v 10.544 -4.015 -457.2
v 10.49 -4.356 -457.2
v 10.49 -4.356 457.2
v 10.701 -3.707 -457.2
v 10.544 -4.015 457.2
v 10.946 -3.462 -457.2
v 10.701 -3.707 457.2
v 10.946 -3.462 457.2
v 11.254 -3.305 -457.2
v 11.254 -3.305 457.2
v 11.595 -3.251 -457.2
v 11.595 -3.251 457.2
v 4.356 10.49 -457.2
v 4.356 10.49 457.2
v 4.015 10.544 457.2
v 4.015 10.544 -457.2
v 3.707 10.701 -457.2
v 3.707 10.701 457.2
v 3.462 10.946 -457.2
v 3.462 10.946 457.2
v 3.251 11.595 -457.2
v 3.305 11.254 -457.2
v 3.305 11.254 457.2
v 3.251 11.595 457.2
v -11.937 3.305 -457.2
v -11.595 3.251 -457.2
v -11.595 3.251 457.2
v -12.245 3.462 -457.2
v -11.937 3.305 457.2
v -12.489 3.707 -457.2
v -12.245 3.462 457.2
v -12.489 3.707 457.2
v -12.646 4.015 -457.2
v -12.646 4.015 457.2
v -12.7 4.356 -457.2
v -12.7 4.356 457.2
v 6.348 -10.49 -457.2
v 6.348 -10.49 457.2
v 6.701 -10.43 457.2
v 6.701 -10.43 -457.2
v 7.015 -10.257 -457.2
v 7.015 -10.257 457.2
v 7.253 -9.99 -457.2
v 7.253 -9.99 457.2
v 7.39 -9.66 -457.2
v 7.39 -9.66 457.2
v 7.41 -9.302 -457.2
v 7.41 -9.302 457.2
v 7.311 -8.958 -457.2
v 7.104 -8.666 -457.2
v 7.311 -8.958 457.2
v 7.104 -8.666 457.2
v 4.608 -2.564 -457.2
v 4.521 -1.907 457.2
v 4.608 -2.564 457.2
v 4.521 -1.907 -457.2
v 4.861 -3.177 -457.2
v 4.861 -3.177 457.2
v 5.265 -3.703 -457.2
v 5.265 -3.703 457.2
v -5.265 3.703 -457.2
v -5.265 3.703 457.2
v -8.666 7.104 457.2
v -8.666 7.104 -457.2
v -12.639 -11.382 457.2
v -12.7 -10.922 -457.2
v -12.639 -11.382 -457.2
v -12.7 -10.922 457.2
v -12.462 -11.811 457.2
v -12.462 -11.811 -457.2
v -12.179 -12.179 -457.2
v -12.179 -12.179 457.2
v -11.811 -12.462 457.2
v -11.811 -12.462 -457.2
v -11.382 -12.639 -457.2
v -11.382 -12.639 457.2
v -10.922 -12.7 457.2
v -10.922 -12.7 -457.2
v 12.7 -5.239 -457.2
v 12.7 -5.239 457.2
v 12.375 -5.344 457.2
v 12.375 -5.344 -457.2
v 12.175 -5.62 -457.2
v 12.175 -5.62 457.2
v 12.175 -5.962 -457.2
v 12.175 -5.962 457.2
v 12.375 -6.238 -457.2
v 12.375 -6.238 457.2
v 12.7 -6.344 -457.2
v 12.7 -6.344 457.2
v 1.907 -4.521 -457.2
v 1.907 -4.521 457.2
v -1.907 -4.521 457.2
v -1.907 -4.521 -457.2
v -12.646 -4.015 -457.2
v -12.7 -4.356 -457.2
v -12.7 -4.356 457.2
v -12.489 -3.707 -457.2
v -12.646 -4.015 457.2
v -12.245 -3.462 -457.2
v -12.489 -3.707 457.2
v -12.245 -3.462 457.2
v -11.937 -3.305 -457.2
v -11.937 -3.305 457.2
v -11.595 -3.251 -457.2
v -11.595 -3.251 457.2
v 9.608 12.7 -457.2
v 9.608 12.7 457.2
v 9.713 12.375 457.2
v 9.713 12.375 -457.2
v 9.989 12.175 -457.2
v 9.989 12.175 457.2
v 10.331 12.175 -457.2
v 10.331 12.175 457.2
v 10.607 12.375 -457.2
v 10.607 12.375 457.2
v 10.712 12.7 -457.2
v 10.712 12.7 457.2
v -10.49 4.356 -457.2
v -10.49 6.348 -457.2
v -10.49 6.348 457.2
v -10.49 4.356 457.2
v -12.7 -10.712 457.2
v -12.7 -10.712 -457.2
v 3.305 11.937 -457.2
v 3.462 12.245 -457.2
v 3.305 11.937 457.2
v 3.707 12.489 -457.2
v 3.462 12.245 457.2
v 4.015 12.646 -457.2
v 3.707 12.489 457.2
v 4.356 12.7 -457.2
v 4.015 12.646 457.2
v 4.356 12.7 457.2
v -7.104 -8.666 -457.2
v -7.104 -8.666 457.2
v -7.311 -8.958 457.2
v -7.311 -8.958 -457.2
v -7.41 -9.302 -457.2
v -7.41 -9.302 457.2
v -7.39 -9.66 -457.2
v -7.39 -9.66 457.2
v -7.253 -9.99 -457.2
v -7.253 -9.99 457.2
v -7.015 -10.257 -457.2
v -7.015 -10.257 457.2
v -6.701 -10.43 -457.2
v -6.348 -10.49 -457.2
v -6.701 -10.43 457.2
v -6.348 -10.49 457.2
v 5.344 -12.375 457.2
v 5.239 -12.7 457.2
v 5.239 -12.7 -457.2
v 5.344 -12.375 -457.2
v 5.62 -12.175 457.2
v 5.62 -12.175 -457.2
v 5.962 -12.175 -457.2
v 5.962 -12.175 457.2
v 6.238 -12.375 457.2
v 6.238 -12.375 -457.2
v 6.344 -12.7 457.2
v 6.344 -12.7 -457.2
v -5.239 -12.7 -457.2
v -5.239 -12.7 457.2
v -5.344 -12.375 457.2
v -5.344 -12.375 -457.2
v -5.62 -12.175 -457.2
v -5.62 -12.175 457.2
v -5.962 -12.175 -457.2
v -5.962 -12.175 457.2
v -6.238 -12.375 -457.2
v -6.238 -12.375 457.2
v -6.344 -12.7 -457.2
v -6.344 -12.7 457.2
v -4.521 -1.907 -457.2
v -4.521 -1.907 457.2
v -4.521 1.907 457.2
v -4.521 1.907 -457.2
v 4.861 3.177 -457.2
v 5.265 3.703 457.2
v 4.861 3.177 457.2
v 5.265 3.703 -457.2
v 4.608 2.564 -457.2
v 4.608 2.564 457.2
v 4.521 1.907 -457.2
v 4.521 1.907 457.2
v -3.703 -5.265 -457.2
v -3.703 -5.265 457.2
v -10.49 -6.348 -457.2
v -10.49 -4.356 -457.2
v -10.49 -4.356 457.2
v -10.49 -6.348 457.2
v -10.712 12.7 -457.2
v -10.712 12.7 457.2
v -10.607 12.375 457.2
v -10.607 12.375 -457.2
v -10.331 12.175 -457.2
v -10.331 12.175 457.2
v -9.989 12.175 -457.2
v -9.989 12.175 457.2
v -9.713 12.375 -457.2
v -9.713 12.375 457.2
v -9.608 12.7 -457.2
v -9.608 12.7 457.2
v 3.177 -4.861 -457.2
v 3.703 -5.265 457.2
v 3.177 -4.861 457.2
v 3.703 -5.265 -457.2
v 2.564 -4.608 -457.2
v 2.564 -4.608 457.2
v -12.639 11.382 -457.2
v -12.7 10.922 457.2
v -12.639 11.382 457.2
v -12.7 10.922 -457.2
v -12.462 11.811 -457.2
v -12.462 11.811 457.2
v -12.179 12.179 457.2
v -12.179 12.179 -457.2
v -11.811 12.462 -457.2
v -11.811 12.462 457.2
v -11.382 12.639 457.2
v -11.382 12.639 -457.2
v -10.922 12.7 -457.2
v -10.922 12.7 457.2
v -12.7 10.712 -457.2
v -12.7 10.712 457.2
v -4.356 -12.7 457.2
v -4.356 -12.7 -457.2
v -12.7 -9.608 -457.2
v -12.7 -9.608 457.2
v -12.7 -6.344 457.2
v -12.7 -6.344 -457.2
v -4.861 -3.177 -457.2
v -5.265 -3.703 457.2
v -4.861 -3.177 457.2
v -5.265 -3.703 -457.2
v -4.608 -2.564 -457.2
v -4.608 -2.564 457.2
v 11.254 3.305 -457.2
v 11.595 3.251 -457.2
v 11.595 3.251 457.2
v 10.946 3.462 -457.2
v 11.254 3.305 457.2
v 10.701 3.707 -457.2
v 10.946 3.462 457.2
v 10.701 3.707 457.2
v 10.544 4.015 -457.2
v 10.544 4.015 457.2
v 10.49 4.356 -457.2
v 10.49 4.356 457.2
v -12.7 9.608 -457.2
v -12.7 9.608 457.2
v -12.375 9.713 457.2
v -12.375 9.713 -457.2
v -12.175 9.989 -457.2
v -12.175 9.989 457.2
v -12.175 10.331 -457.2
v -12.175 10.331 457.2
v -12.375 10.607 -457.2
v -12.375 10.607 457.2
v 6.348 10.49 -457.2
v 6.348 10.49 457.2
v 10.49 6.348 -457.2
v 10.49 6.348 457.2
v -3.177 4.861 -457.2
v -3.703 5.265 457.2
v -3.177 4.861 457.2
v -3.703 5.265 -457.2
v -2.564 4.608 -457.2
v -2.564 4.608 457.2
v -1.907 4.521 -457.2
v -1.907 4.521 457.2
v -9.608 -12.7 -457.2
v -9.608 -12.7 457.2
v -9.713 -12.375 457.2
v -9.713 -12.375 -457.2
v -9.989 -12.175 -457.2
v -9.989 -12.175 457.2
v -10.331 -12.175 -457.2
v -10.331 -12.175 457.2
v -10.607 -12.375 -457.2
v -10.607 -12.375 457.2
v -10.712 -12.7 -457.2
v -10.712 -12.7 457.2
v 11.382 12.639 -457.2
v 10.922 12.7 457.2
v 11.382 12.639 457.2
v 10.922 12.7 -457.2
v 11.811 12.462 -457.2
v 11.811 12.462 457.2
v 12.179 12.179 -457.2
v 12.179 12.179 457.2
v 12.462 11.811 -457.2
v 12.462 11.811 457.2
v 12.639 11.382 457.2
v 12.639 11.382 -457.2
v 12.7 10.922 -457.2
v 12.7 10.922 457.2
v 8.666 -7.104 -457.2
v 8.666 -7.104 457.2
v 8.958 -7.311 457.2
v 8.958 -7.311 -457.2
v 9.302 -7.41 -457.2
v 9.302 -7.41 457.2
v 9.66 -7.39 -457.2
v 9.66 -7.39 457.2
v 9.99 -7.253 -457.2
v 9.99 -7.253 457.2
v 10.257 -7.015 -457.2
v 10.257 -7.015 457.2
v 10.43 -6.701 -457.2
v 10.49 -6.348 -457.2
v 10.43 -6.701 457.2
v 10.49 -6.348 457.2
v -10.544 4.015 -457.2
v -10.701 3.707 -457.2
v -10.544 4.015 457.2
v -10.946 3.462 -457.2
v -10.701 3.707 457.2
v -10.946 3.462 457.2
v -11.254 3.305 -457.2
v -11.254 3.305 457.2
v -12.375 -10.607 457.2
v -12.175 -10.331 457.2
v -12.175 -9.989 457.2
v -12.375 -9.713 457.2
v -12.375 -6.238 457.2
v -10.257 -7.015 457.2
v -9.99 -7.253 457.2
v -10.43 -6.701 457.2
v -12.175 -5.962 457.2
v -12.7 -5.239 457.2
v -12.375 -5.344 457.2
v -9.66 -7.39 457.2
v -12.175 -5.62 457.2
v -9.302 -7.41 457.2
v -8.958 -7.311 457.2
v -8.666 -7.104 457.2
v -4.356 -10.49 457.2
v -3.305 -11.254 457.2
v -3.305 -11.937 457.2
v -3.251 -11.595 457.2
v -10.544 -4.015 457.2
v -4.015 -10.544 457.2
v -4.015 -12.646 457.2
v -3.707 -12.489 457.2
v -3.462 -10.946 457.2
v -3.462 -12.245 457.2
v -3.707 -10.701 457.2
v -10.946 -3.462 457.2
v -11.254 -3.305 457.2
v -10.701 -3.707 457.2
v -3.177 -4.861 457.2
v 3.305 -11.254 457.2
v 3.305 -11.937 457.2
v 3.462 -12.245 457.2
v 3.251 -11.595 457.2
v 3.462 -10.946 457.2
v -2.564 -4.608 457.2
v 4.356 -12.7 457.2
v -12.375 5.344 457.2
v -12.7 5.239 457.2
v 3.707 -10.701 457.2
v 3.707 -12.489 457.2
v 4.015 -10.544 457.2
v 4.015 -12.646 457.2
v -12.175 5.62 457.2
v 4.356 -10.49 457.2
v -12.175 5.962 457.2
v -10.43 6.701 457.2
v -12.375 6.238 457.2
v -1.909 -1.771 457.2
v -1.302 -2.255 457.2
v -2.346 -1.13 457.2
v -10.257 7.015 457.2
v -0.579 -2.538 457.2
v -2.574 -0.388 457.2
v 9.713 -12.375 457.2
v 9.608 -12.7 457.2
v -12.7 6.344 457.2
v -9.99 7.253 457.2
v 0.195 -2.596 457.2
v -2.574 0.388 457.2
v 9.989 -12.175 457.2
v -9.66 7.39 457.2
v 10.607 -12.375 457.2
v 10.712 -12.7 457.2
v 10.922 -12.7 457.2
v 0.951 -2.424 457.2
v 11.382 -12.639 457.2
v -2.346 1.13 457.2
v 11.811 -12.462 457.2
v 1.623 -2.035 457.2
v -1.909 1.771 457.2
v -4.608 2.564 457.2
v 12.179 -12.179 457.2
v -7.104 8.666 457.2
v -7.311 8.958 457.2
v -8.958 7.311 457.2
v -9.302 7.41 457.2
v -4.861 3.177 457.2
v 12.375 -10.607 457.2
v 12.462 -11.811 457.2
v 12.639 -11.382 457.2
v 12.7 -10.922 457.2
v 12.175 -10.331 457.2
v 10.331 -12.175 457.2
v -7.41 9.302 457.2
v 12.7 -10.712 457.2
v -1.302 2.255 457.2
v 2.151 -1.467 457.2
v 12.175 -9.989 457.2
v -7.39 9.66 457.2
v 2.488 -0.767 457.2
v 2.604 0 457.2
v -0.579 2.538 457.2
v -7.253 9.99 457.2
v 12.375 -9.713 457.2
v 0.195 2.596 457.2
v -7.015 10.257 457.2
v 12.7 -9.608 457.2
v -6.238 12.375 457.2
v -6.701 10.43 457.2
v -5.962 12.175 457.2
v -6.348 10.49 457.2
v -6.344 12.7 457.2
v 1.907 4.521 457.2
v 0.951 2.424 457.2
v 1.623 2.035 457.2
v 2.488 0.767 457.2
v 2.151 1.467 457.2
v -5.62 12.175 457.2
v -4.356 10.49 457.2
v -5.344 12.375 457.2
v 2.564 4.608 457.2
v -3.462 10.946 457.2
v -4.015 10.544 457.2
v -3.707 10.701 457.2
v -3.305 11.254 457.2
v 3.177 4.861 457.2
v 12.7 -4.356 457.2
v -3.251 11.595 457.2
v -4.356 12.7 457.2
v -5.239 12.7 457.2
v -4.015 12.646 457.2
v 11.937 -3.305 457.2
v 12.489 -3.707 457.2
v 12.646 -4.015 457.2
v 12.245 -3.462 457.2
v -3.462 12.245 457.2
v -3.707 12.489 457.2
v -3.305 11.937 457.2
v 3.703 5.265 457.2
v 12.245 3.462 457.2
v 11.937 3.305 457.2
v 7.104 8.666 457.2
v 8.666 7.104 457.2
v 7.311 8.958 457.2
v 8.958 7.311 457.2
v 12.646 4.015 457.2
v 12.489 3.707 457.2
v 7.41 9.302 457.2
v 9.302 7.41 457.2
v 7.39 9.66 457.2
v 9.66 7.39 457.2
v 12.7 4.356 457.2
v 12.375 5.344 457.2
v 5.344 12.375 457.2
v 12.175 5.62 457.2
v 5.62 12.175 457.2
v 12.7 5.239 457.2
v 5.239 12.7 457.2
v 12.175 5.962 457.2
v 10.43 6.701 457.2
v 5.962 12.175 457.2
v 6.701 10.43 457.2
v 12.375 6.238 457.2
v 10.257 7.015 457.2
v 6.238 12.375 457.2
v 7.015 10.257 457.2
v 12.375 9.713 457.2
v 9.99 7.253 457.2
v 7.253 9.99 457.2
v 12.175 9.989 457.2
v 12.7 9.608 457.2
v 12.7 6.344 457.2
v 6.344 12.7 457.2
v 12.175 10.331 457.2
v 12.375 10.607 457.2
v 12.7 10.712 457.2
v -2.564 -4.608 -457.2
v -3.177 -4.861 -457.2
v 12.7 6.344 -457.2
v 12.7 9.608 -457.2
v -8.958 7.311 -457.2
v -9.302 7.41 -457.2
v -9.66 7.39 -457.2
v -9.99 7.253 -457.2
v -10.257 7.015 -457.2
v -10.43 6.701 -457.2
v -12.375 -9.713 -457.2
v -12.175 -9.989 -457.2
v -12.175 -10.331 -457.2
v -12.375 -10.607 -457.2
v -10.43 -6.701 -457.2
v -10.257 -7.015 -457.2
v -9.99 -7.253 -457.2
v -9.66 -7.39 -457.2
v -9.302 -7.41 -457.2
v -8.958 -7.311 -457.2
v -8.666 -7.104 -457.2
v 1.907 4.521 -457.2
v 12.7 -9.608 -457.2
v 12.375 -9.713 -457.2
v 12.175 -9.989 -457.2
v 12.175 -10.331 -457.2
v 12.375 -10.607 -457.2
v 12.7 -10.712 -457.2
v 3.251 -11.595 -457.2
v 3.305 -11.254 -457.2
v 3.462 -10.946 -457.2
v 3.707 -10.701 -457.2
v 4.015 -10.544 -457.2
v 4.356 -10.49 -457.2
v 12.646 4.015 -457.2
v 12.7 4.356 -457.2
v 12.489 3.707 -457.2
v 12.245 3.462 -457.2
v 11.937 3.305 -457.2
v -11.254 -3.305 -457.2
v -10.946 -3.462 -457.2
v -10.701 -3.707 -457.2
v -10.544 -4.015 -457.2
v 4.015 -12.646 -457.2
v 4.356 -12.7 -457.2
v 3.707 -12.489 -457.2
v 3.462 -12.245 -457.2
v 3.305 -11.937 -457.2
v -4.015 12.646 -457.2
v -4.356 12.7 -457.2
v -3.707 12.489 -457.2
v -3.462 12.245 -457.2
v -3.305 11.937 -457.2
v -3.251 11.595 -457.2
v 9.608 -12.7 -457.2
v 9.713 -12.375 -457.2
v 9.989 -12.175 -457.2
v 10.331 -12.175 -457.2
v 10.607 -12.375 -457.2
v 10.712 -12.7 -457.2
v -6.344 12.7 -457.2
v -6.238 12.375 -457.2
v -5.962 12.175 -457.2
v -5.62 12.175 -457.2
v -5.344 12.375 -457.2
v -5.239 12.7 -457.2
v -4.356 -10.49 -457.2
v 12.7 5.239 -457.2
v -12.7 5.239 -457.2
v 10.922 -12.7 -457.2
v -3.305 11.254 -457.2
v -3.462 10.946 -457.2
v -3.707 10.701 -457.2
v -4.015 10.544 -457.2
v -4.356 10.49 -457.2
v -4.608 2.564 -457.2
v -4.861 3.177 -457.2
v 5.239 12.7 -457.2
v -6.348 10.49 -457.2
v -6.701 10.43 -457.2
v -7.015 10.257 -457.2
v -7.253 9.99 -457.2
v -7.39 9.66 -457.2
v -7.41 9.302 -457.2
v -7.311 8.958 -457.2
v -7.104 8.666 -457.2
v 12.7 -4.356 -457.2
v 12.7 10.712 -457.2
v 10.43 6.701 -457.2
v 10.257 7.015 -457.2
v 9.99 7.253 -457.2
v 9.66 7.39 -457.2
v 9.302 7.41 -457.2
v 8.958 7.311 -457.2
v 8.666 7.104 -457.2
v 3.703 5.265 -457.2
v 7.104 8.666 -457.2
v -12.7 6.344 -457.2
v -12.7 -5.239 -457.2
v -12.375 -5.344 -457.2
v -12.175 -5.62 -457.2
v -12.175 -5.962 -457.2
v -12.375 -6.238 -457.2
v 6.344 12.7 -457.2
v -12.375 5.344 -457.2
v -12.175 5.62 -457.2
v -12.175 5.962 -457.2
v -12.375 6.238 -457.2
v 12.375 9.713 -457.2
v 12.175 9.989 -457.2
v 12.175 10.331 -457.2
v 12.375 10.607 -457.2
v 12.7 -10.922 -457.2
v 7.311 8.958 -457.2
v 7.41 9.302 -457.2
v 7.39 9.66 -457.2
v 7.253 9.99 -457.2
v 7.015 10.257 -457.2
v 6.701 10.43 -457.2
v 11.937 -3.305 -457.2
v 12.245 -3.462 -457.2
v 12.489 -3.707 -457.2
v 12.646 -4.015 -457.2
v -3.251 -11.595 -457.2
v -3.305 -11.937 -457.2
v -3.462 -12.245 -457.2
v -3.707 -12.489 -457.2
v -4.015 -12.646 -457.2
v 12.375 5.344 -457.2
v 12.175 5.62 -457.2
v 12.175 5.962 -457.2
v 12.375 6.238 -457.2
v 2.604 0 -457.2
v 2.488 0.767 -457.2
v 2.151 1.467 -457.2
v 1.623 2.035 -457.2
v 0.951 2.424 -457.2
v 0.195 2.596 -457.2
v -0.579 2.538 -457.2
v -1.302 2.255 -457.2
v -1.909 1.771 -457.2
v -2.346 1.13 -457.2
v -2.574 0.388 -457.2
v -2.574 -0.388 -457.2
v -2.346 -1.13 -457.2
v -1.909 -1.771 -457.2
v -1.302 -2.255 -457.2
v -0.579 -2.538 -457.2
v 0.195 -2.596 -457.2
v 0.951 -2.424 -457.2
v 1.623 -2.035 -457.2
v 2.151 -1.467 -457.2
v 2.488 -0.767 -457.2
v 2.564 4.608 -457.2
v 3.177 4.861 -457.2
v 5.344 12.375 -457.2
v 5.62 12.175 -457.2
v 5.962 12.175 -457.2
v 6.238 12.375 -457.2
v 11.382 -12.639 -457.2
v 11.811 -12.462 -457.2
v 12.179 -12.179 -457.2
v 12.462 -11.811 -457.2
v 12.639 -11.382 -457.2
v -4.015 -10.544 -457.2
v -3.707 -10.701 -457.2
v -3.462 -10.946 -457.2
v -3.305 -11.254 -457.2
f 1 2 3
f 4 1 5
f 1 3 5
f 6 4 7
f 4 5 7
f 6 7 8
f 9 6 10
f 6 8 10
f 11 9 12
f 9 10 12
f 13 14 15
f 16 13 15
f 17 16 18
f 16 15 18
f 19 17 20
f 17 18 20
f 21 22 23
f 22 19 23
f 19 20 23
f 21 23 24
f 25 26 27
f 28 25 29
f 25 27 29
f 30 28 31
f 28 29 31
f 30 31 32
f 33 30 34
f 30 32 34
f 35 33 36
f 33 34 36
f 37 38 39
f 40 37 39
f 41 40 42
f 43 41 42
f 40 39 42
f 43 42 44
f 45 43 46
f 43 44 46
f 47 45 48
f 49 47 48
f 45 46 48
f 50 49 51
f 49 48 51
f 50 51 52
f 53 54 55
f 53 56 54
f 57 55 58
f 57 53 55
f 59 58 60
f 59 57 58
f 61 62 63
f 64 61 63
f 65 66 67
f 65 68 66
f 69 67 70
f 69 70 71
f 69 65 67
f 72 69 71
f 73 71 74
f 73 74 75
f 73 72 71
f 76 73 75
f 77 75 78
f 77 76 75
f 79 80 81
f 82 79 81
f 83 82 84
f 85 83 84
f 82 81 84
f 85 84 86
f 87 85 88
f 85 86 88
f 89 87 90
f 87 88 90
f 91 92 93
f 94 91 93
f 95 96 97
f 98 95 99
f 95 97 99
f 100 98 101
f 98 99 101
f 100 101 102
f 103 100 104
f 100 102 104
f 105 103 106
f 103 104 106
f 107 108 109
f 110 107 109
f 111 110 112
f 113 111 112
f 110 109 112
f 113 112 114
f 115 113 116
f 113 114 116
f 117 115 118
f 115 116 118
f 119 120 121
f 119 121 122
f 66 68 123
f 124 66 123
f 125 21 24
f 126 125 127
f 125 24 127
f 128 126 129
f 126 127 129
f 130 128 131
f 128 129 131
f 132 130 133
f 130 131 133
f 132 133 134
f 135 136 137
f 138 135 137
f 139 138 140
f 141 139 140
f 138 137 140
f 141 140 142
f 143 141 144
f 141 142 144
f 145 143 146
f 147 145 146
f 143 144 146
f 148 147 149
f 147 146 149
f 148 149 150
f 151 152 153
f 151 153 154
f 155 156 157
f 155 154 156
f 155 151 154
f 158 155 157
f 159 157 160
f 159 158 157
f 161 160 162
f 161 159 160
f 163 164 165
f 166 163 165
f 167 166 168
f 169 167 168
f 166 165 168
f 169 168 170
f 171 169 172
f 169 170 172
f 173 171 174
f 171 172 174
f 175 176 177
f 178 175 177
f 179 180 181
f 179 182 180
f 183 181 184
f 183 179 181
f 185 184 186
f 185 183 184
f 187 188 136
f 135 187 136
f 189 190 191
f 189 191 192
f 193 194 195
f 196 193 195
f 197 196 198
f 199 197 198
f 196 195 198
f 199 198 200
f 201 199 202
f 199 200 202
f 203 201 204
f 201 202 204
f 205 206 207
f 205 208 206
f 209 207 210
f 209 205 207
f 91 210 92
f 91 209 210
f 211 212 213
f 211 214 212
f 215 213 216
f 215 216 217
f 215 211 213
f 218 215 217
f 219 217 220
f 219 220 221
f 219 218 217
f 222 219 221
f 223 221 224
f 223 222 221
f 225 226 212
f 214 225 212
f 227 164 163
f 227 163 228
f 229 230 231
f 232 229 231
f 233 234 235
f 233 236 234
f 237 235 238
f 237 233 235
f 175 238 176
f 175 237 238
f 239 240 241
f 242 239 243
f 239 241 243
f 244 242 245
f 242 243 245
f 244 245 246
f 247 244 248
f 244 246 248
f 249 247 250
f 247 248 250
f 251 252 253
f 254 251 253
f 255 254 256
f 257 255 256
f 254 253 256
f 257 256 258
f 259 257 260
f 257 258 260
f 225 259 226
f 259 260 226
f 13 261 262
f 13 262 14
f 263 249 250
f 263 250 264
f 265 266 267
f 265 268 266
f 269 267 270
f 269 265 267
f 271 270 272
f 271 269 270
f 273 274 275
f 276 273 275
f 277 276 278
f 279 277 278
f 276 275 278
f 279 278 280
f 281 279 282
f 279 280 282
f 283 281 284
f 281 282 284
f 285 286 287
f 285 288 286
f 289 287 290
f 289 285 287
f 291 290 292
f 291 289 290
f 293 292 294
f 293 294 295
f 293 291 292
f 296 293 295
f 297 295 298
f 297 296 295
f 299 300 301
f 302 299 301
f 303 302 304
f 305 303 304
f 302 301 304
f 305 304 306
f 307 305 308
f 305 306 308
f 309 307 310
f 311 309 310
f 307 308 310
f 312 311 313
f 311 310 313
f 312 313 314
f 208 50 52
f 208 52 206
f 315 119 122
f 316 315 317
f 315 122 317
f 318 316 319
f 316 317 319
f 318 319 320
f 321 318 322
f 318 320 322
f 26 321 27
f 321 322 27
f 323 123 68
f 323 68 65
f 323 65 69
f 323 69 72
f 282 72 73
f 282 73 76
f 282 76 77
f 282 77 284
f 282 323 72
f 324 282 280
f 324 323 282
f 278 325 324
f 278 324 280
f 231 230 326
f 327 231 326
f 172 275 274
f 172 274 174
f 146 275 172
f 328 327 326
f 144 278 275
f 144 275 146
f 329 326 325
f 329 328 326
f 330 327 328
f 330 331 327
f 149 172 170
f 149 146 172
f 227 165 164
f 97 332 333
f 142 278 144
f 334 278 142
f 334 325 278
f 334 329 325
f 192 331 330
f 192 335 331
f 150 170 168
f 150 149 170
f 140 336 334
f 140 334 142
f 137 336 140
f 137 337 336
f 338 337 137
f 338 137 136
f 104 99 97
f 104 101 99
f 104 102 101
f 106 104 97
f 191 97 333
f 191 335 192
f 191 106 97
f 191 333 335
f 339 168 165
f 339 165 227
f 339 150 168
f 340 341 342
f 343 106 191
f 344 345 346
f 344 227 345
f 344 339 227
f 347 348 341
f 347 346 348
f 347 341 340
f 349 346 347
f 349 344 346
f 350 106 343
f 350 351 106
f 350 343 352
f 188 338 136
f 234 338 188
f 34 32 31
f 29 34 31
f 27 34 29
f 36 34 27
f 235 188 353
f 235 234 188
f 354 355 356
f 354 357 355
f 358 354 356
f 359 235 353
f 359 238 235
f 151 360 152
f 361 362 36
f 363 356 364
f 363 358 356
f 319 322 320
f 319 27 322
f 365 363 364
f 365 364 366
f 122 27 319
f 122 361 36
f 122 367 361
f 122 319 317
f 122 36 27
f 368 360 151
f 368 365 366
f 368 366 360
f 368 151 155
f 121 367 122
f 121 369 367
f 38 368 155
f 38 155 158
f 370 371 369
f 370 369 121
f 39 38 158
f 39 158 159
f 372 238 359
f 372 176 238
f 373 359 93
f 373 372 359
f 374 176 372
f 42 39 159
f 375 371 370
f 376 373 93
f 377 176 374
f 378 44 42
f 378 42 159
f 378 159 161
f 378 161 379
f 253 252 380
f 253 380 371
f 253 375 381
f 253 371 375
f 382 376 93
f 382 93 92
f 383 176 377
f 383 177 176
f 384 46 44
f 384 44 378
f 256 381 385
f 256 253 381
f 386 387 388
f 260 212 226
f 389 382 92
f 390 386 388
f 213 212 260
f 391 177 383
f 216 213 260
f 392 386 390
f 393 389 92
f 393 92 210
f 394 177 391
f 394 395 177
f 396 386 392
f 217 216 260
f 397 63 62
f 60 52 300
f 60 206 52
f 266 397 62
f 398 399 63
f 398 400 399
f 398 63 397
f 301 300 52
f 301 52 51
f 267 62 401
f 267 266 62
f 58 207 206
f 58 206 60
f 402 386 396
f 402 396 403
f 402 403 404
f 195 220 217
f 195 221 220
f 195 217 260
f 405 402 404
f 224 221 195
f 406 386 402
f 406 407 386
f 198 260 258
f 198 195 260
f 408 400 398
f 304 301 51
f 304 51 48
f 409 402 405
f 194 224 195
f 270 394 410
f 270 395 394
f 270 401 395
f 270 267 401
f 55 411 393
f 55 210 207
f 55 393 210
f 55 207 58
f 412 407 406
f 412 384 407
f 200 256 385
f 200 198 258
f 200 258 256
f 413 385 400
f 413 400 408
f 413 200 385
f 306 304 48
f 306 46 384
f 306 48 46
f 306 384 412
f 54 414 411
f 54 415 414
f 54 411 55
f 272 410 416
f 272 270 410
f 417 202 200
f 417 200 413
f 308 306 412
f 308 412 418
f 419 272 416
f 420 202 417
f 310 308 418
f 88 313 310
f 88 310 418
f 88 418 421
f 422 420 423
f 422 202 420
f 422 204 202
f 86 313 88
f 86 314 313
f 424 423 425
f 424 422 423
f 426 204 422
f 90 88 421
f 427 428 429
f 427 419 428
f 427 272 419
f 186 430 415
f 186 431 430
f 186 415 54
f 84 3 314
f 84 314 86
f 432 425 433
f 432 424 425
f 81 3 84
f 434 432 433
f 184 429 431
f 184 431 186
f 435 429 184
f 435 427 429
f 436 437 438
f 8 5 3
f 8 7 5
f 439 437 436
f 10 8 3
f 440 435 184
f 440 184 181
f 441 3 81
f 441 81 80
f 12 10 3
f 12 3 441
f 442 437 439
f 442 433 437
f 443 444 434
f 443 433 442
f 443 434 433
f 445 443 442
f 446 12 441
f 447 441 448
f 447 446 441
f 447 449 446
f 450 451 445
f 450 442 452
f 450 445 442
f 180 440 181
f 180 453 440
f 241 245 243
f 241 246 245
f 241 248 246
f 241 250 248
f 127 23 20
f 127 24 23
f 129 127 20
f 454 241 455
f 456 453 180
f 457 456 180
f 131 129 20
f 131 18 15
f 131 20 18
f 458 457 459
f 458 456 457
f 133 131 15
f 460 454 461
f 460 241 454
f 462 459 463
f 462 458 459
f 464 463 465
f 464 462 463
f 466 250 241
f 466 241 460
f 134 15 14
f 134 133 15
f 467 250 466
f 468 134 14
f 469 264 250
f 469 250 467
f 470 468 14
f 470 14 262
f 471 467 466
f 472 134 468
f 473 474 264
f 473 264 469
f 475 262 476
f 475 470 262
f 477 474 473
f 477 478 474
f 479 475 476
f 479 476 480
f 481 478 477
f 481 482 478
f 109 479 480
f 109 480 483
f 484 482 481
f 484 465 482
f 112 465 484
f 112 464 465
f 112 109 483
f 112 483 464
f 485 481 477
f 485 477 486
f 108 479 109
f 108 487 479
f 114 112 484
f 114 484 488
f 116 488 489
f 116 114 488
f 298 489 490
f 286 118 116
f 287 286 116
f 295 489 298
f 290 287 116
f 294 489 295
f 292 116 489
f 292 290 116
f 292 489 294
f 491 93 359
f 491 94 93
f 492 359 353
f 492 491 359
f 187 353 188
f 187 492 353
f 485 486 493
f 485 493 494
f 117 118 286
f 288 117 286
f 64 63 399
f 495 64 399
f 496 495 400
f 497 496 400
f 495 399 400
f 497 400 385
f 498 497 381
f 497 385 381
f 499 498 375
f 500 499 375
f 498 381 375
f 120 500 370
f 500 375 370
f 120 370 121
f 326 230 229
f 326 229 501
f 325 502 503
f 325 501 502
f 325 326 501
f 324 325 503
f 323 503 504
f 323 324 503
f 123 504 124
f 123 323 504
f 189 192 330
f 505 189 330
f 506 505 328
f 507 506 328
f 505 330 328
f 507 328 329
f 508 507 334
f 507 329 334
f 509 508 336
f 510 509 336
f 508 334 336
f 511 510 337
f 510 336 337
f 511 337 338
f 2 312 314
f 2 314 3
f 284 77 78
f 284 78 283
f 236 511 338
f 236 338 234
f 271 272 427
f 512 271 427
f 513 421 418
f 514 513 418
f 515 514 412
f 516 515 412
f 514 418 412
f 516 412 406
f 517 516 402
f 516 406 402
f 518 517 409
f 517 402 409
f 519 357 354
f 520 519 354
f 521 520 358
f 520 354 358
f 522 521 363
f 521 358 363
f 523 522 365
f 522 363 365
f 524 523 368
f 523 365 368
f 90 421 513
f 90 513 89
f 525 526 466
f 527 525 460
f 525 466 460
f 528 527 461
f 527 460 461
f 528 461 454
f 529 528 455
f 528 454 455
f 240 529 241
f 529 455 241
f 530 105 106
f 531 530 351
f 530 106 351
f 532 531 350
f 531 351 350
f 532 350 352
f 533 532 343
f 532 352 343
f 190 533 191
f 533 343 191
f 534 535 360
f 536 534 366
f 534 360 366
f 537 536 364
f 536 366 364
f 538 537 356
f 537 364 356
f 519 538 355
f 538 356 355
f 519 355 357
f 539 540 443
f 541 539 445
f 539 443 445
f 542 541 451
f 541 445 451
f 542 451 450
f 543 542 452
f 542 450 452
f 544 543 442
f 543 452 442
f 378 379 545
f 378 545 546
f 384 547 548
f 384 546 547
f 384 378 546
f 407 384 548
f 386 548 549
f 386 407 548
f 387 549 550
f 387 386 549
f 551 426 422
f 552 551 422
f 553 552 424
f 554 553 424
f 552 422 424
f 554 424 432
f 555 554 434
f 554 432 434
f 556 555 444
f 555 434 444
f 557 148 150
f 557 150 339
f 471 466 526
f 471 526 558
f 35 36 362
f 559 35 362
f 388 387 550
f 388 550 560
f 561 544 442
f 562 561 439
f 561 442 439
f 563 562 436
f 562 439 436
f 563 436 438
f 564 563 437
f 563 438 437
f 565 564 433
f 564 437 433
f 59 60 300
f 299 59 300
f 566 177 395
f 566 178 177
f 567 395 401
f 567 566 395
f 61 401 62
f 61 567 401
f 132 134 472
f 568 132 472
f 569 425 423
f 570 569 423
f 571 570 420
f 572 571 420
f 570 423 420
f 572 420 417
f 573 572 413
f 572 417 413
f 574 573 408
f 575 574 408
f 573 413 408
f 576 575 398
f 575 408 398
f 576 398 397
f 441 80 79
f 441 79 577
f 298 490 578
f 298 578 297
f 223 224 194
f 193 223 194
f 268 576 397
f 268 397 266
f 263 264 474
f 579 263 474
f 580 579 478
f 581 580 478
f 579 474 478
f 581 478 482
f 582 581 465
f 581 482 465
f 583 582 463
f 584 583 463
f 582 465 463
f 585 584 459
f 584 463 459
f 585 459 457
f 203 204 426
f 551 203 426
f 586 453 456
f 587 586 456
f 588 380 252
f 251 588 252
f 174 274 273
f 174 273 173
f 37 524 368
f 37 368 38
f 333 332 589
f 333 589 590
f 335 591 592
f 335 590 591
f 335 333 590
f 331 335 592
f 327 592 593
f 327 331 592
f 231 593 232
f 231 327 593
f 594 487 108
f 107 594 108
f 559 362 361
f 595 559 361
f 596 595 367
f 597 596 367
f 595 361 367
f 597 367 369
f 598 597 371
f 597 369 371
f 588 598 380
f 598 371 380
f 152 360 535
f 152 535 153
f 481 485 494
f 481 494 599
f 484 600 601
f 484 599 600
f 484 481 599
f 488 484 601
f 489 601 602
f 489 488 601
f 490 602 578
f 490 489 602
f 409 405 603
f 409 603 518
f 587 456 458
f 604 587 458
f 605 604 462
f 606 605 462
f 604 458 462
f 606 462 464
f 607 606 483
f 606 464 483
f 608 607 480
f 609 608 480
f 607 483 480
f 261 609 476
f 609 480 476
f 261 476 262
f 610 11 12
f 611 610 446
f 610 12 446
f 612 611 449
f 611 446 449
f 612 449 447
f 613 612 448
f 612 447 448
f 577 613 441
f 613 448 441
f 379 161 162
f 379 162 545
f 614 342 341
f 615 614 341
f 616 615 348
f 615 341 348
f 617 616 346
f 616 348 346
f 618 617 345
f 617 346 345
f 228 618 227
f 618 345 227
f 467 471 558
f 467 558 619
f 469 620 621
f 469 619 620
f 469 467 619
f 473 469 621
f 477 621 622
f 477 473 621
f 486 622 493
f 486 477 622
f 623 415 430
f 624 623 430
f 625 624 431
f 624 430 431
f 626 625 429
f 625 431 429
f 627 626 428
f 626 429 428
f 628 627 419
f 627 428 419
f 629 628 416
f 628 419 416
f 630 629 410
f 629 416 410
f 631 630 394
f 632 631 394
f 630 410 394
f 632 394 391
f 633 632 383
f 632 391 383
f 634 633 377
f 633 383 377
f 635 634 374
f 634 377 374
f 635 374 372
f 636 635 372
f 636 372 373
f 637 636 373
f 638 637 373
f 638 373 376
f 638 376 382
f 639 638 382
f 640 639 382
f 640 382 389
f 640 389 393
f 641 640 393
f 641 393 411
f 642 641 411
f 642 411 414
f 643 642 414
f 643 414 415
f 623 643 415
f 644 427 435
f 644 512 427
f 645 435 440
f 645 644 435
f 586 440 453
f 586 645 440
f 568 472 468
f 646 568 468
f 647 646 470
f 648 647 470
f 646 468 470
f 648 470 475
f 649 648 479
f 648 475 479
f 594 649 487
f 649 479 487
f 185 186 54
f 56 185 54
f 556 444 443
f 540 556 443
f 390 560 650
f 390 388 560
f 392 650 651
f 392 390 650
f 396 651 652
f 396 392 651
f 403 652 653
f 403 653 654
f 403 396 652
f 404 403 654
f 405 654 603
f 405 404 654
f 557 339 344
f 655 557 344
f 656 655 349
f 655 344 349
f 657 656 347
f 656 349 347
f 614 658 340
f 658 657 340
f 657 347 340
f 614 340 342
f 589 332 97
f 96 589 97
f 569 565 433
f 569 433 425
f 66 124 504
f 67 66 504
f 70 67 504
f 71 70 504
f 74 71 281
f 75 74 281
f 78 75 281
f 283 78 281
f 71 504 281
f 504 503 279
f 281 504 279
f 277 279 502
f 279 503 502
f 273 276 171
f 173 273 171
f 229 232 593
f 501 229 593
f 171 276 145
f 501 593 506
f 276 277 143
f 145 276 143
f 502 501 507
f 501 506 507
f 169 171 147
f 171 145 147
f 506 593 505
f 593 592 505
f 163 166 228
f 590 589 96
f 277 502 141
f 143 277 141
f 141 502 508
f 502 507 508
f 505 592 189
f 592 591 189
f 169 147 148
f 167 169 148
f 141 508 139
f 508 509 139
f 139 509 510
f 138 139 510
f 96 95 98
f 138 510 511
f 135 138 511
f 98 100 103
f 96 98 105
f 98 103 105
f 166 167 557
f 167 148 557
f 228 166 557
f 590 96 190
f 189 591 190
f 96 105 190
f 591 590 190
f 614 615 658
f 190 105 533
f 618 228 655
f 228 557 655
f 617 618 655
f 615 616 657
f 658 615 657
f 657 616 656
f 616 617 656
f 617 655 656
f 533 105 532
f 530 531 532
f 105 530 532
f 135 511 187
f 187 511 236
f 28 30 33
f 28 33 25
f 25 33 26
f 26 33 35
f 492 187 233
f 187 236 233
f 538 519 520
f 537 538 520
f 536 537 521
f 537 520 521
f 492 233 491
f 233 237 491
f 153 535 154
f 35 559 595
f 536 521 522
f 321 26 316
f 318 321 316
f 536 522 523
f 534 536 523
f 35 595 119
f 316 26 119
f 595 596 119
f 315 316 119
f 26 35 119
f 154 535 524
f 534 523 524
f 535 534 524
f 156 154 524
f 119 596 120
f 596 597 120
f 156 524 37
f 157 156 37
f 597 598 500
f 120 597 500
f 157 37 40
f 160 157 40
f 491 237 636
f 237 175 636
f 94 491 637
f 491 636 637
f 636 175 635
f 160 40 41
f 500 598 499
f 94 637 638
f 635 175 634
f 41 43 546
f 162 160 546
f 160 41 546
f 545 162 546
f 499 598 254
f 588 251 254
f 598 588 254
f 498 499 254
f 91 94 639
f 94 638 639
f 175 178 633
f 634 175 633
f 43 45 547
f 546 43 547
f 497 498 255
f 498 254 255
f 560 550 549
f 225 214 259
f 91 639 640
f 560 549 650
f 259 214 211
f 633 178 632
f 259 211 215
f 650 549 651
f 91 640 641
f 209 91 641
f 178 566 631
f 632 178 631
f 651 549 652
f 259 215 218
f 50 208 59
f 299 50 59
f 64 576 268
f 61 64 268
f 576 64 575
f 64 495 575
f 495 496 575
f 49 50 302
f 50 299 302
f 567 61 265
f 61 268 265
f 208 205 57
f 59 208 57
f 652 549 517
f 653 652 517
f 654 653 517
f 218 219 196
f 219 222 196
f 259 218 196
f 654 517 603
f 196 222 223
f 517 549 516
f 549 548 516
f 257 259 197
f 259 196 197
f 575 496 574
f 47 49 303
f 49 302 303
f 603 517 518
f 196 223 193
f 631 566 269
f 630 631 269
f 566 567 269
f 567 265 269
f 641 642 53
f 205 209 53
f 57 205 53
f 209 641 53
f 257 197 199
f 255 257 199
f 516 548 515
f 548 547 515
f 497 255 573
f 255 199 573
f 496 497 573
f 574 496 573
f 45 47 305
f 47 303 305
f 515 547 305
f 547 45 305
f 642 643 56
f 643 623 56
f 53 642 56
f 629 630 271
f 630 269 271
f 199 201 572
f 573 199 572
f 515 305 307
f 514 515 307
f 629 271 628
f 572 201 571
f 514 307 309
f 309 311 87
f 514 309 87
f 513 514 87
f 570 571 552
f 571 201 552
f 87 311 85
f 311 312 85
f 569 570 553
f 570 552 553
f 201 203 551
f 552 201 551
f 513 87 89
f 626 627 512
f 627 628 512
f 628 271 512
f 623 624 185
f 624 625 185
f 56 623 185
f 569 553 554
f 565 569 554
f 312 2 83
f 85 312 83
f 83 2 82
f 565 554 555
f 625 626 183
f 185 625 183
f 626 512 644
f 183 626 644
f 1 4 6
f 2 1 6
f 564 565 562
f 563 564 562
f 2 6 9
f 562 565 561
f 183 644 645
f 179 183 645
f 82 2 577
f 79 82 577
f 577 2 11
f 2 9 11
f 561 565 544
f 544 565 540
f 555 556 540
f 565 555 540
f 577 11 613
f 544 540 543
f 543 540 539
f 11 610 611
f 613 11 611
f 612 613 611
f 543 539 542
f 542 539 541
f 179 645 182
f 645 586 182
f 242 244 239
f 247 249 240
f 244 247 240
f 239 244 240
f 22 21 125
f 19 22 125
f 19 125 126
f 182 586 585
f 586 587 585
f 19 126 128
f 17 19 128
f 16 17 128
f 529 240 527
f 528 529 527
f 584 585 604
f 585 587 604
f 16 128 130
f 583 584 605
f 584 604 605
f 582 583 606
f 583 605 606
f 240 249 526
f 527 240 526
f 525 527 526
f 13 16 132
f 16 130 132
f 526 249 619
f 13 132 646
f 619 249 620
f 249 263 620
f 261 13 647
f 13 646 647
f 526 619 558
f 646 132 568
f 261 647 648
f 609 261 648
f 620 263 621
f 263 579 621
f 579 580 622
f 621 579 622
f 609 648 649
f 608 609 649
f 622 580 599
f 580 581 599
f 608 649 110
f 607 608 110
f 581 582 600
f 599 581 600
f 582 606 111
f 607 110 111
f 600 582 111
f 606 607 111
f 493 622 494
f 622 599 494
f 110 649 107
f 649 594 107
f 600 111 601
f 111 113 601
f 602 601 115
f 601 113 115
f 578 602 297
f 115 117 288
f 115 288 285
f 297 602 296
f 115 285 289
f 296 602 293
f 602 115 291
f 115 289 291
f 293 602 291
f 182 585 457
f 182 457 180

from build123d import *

# Parameters (mm, degrees)
SKETCH3_W                = 25.4
SKETCH3_H                = 25.4
BOSS_EXTRUDE1_DEPTH      = 457.2
BOSS_EXTRUDE1_DEPTH_BACK = 457.2
SKETCH4_R                = 2.6035
CUT_EXTRUDE1_DEPTH       = 915.4
CUT_EXTRUDE2_DEPTH       = 915.4
FILLET1_R                = 2.54
FILLET2_R                = 1.778


with BuildPart() as part:
    # Sketch3 → Boss-Extrude1 (new body, two sides)
    with BuildSketch(Plane.XY) as boss_extrude1_sk:
        Rectangle(SKETCH3_W, SKETCH3_H)
    extrude(amount=BOSS_EXTRUDE1_DEPTH)
    extrude(boss_extrude1_sk.sketch, amount=-BOSS_EXTRUDE1_DEPTH_BACK)

    # Sketch4 → Cut-Extrude1 (cut, through all)
    with BuildSketch(Plane.XY.offset(457.2)):
        with BuildLine():
            Line((3.2512, 12.7), (-3.2512, 12.7))
            Line((-3.2512, 12.7), (-3.2512, 10.4902))
            Line((-3.2512, 10.4902), (-6.348478019, 10.4902))
            ThreePointArc((-6.348478019, 10.4902), (-7.335478831, 9.830707141), (-7.103895736, 8.666460301))
            Line((-7.103895736, 8.666460301), (-2.958635435, 4.5212))
            Line((-2.958635435, 4.5212), (2.958635435, 4.5212))
            Line((2.958635435, 4.5212), (7.103895736, 8.666460301))
            ThreePointArc((7.103895736, 8.666460301), (7.335478831, 9.830707141), (6.348478019, 10.4902))
            Line((6.348478019, 10.4902), (3.2512, 10.4902))
            Line((3.2512, 10.4902), (3.2512, 12.7))
        make_face()
        with BuildLine():
            Line((12.7, -3.2512), (12.7, 3.2512))
            Line((12.7, 3.2512), (10.4902, 3.2512))
            Line((10.4902, 3.2512), (10.4902, 6.348478019))
            ThreePointArc((10.4902, 6.348478019), (9.830707141, 7.335478831), (8.666460301, 7.103895736))
            Line((8.666460301, 7.103895736), (4.5212, 2.958635435))
            Line((4.5212, 2.958635435), (4.5212, -2.958635435))
            Line((4.5212, -2.958635435), (8.666460301, -7.103895736))
            ThreePointArc((8.666460301, -7.103895736), (9.830707141, -7.335478831), (10.4902, -6.348478019))
            Line((10.4902, -6.348478019), (10.4902, -3.2512))
            Line((10.4902, -3.2512), (12.7, -3.2512))
        make_face()
        with BuildLine():
            Line((-3.2512, -10.4902), (-3.2512, -12.7))
            Line((-3.2512, -12.7), (3.2512, -12.7))
            Line((3.2512, -12.7), (3.2512, -10.4902))
            Line((3.2512, -10.4902), (6.348478019, -10.4902))
            ThreePointArc((6.348478019, -10.4902), (7.335478831, -9.830707141), (7.103895736, -8.666460301))
            Line((7.103895736, -8.666460301), (2.958635435, -4.5212))
            Line((2.958635435, -4.5212), (-2.958635435, -4.5212))
            Line((-2.958635435, -4.5212), (-7.103895736, -8.666460301))
            ThreePointArc((-7.103895736, -8.666460301), (-7.335478831, -9.830707141), (-6.348478019, -10.4902))
            Line((-6.348478019, -10.4902), (-3.2512, -10.4902))
        make_face()
        with BuildLine():
            Line((-10.4902, 3.2512), (-12.7, 3.2512))
            Line((-12.7, 3.2512), (-12.7, -3.2512))
            Line((-12.7, -3.2512), (-10.4902, -3.2512))
            Line((-10.4902, -3.2512), (-10.4902, -6.348478019))
            ThreePointArc((-10.4902, -6.348478019), (-9.830707141, -7.335478831), (-8.666460301, -7.103895736))
            Line((-8.666460301, -7.103895736), (-4.5212, -2.958635435))
            Line((-4.5212, -2.958635435), (-4.5212, 2.958635435))
            Line((-4.5212, 2.958635435), (-8.666460301, 7.103895736))
            ThreePointArc((-8.666460301, 7.103895736), (-9.830707141, 7.335478831), (-10.4902, 6.348478019))
            Line((-10.4902, 6.348478019), (-10.4902, 3.2512))
        make_face()
        Circle(SKETCH4_R)
    extrude(amount=-CUT_EXTRUDE1_DEPTH, mode=Mode.SUBTRACT)

    # Sketch5 → Cut-Extrude2 (cut, through all)
    with BuildSketch(Plane.XY.offset(457.2)):
        with BuildLine():
            ThreePointArc((-11.5951, 3.2512), (-12.376382283, 3.574817717), (-12.7, 4.3561))
            Line((-12.7, 4.3561), (-12.7, 3.2512))
            Line((-12.7, 3.2512), (-11.5951, 3.2512))
        make_face()
        with BuildLine():
            ThreePointArc((-10.4902, 4.3561), (-10.813817717, 3.574817717), (-11.5951, 3.2512))
            Line((-11.5951, 3.2512), (-10.4902, 3.2512))
            Line((-10.4902, 3.2512), (-10.4902, 4.3561))
        make_face()
        with BuildLine():
            Line((-12.7, -3.2512), (-12.7, -4.3561))
            ThreePointArc((-12.7, -4.3561), (-12.376382283, -3.574817717), (-11.5951, -3.2512))
            Line((-11.5951, -3.2512), (-12.7, -3.2512))
        make_face()
        with BuildLine():
            Line((-10.4902, -3.2512), (-11.5951, -3.2512))
            ThreePointArc((-11.5951, -3.2512), (-10.813817717, -3.574817717), (-10.4902, -4.3561))
            Line((-10.4902, -4.3561), (-10.4902, -3.2512))
        make_face()
        with BuildLine():
            Line((-3.2512, -11.595100007), (-3.2512, -10.4902))
            Line((-3.2512, -10.4902), (-4.3561, -10.4902))
            ThreePointArc((-4.3561, -10.4902), (-3.574817715, -10.81381772), (-3.2512, -11.595100007))
        make_face()
        with BuildLine():
            Line((-3.2512, -12.7), (-3.2512, -11.595100007))
            ThreePointArc((-3.2512, -11.595100007), (-3.57481772, -12.376382285), (-4.3561, -12.7))
            Line((-4.3561, -12.7), (-3.2512, -12.7))
        make_face()
        with BuildLine():
            Line((3.2512, -10.4902), (3.2512, -11.5951))
            ThreePointArc((3.2512, -11.5951), (3.574817718, -10.813817717), (4.3561, -10.4902))
            Line((4.3561, -10.4902), (3.2512, -10.4902))
        make_face()
        with BuildLine():
            Line((3.2512, -12.7), (4.3561, -12.7))
            ThreePointArc((4.3561, -12.7), (3.574817717, -12.376382282), (3.2512, -11.5951))
            Line((3.2512, -11.5951), (3.2512, -12.7))
        make_face()
        with BuildLine():
            Line((11.5951, -3.2512), (10.4902, -3.2512))
            Line((10.4902, -3.2512), (10.4902, -4.3561))
            ThreePointArc((10.4902, -4.3561), (10.813817717, -3.574817717), (11.5951, -3.2512))
        make_face()
        with BuildLine():
            Line((12.7, -3.2512), (11.5951, -3.2512))
            ThreePointArc((11.5951, -3.2512), (12.376382283, -3.574817717), (12.7, -4.3561))
            Line((12.7, -4.3561), (12.7, -3.2512))
        make_face()
        with BuildLine():
            Line((10.4902, 3.2512), (11.5951, 3.2512))
            ThreePointArc((11.5951, 3.2512), (10.813817717, 3.574817717), (10.4902, 4.3561))
            Line((10.4902, 4.3561), (10.4902, 3.2512))
        make_face()
        with BuildLine():
            Line((12.7, 3.2512), (12.7, 4.3561))
            ThreePointArc((12.7, 4.3561), (12.376382283, 3.574817717), (11.5951, 3.2512))
            Line((11.5951, 3.2512), (12.7, 3.2512))
        make_face()
        with BuildLine():
            Line((3.2512, 12.7), (3.2512, 11.595099996))
            ThreePointArc((3.2512, 11.595099996), (3.574817716, 12.376382281), (4.3561, 12.7))
            Line((4.3561, 12.7), (3.2512, 12.7))
        make_face()
        with BuildLine():
            Line((3.2512, 11.595099996), (3.2512, 10.4902))
            Line((3.2512, 10.4902), (4.3561, 10.4902))
            ThreePointArc((4.3561, 10.4902), (3.574817719, 10.813817716), (3.2512, 11.595099996))
        make_face()
        with BuildLine():
            Line((-3.2512, 12.7), (-4.3561, 12.7))
            ThreePointArc((-4.3561, 12.7), (-3.574817717, 12.376382283), (-3.2512, 11.5951))
            Line((-3.2512, 11.5951), (-3.2512, 12.7))
        make_face()
        with BuildLine():
            Line((-3.2512, 10.4902), (-3.2512, 11.5951))
            ThreePointArc((-3.2512, 11.5951), (-3.574817717, 10.813817717), (-4.3561, 10.4902))
            Line((-4.3561, 10.4902), (-3.2512, 10.4902))
        make_face()
        with BuildLine():
            ThreePointArc((-12.7, 5.23875), (-12.14755, 5.7912), (-12.7, 6.34365))
            Line((-12.7, 6.34365), (-12.7, 5.23875))
        make_face()
        with BuildLine():
            ThreePointArc((-12.7, 9.60755), (-12.14755, 10.16), (-12.7, 10.71245))
            Line((-12.7, 10.71245), (-12.7, 9.60755))
        make_face()
        with BuildLine():
            ThreePointArc((-10.71245, 12.7), (-10.16, 12.14755), (-9.60755, 12.7))
            Line((-9.60755, 12.7), (-10.71245, 12.7))
        make_face()
        with BuildLine():
            ThreePointArc((-6.34365, 12.7), (-5.7912, 12.14755), (-5.23875, 12.7))
            Line((-5.23875, 12.7), (-6.34365, 12.7))
        make_face()
        with BuildLine():
            Line((6.34365, 12.7), (5.23875, 12.7))
            ThreePointArc((5.23875, 12.7), (5.7912, 12.14755), (6.34365, 12.7))
        make_face()
        with BuildLine():
            Line((10.71245, 12.7), (9.60755, 12.7))
            ThreePointArc((9.60755, 12.7), (10.16, 12.14755), (10.71245, 12.7))
        make_face()
        with BuildLine():
            Line((12.7, 10.71245), (12.7, 9.60755))
            ThreePointArc((12.7, 9.60755), (12.14755, 10.16), (12.7, 10.71245))
        make_face()
        with BuildLine():
            Line((12.7, 6.34365), (12.7, 5.23875))
            ThreePointArc((12.7, 5.23875), (12.14755, 5.7912), (12.7, 6.34365))
        make_face()
        with BuildLine():
            Line((-12.7, -6.34365), (-12.7, -5.23875))
            ThreePointArc((-12.7, -5.23875), (-12.14755, -5.7912), (-12.7, -6.34365))
        make_face()
        with BuildLine():
            Line((-12.7, -10.71245), (-12.7, -9.60755))
            ThreePointArc((-12.7, -9.60755), (-12.14755, -10.16), (-12.7, -10.71245))
        make_face()
        with BuildLine():
            Line((-10.71245, -12.7), (-9.60755, -12.7))
            ThreePointArc((-9.60755, -12.7), (-10.16, -12.14755), (-10.71245, -12.7))
        make_face()
        with BuildLine():
            Line((-6.34365, -12.7), (-5.23875, -12.7))
            ThreePointArc((-5.23875, -12.7), (-5.7912, -12.14755), (-6.34365, -12.7))
        make_face()
        with BuildLine():
            Line((12.7, -10.71245), (12.7, -9.60755))
            ThreePointArc((12.7, -9.60755), (12.14755, -10.16), (12.7, -10.71245))
        make_face()
        with BuildLine():
            Line((12.7, -6.34365), (12.7, -5.23875))
            ThreePointArc((12.7, -5.23875), (12.14755, -5.7912), (12.7, -6.34365))
        make_face()
        with BuildLine():
            Line((10.71245, -12.7), (9.60755, -12.7))
            ThreePointArc((9.60755, -12.7), (10.16, -12.14755), (10.71245, -12.7))
        make_face()
        with BuildLine():
            Line((6.34365, -12.7), (5.23875, -12.7))
            ThreePointArc((5.23875, -12.7), (5.7912, -12.14755), (6.34365, -12.7))
        make_face()
    extrude(amount=-CUT_EXTRUDE2_DEPTH, mode=Mode.SUBTRACT)

    # Fillet1
    fillet1_edges = [part.edges().sort_by_distance(p)[0] for p in [
        (2.958635435, 4.5212, 0),
        (-2.958635435, 4.5212, 0),
        (-2.958635435, -4.5212, 0),
        (2.958635435, -4.5212, 0),
        (4.5212, -2.958635435, 0),
        (4.5212, 2.958635435, 0),
        (-4.5212, 2.958635435, 0),
        (-4.5212, -2.958635435, 0),
    ]]
    fillet(fillet1_edges, radius=FILLET1_R)

    # Fillet2
    fillet2_edges = [part.edges().sort_by_distance(p)[0] for p in [
        (-12.7, 12.7, 0),
        (12.7, 12.7, 0),
        (12.7, -12.7, 0),
        (-12.7, -12.7, 0),
    ]]
    fillet(fillet2_edges, radius=FILLET2_R)


solid = part.part
